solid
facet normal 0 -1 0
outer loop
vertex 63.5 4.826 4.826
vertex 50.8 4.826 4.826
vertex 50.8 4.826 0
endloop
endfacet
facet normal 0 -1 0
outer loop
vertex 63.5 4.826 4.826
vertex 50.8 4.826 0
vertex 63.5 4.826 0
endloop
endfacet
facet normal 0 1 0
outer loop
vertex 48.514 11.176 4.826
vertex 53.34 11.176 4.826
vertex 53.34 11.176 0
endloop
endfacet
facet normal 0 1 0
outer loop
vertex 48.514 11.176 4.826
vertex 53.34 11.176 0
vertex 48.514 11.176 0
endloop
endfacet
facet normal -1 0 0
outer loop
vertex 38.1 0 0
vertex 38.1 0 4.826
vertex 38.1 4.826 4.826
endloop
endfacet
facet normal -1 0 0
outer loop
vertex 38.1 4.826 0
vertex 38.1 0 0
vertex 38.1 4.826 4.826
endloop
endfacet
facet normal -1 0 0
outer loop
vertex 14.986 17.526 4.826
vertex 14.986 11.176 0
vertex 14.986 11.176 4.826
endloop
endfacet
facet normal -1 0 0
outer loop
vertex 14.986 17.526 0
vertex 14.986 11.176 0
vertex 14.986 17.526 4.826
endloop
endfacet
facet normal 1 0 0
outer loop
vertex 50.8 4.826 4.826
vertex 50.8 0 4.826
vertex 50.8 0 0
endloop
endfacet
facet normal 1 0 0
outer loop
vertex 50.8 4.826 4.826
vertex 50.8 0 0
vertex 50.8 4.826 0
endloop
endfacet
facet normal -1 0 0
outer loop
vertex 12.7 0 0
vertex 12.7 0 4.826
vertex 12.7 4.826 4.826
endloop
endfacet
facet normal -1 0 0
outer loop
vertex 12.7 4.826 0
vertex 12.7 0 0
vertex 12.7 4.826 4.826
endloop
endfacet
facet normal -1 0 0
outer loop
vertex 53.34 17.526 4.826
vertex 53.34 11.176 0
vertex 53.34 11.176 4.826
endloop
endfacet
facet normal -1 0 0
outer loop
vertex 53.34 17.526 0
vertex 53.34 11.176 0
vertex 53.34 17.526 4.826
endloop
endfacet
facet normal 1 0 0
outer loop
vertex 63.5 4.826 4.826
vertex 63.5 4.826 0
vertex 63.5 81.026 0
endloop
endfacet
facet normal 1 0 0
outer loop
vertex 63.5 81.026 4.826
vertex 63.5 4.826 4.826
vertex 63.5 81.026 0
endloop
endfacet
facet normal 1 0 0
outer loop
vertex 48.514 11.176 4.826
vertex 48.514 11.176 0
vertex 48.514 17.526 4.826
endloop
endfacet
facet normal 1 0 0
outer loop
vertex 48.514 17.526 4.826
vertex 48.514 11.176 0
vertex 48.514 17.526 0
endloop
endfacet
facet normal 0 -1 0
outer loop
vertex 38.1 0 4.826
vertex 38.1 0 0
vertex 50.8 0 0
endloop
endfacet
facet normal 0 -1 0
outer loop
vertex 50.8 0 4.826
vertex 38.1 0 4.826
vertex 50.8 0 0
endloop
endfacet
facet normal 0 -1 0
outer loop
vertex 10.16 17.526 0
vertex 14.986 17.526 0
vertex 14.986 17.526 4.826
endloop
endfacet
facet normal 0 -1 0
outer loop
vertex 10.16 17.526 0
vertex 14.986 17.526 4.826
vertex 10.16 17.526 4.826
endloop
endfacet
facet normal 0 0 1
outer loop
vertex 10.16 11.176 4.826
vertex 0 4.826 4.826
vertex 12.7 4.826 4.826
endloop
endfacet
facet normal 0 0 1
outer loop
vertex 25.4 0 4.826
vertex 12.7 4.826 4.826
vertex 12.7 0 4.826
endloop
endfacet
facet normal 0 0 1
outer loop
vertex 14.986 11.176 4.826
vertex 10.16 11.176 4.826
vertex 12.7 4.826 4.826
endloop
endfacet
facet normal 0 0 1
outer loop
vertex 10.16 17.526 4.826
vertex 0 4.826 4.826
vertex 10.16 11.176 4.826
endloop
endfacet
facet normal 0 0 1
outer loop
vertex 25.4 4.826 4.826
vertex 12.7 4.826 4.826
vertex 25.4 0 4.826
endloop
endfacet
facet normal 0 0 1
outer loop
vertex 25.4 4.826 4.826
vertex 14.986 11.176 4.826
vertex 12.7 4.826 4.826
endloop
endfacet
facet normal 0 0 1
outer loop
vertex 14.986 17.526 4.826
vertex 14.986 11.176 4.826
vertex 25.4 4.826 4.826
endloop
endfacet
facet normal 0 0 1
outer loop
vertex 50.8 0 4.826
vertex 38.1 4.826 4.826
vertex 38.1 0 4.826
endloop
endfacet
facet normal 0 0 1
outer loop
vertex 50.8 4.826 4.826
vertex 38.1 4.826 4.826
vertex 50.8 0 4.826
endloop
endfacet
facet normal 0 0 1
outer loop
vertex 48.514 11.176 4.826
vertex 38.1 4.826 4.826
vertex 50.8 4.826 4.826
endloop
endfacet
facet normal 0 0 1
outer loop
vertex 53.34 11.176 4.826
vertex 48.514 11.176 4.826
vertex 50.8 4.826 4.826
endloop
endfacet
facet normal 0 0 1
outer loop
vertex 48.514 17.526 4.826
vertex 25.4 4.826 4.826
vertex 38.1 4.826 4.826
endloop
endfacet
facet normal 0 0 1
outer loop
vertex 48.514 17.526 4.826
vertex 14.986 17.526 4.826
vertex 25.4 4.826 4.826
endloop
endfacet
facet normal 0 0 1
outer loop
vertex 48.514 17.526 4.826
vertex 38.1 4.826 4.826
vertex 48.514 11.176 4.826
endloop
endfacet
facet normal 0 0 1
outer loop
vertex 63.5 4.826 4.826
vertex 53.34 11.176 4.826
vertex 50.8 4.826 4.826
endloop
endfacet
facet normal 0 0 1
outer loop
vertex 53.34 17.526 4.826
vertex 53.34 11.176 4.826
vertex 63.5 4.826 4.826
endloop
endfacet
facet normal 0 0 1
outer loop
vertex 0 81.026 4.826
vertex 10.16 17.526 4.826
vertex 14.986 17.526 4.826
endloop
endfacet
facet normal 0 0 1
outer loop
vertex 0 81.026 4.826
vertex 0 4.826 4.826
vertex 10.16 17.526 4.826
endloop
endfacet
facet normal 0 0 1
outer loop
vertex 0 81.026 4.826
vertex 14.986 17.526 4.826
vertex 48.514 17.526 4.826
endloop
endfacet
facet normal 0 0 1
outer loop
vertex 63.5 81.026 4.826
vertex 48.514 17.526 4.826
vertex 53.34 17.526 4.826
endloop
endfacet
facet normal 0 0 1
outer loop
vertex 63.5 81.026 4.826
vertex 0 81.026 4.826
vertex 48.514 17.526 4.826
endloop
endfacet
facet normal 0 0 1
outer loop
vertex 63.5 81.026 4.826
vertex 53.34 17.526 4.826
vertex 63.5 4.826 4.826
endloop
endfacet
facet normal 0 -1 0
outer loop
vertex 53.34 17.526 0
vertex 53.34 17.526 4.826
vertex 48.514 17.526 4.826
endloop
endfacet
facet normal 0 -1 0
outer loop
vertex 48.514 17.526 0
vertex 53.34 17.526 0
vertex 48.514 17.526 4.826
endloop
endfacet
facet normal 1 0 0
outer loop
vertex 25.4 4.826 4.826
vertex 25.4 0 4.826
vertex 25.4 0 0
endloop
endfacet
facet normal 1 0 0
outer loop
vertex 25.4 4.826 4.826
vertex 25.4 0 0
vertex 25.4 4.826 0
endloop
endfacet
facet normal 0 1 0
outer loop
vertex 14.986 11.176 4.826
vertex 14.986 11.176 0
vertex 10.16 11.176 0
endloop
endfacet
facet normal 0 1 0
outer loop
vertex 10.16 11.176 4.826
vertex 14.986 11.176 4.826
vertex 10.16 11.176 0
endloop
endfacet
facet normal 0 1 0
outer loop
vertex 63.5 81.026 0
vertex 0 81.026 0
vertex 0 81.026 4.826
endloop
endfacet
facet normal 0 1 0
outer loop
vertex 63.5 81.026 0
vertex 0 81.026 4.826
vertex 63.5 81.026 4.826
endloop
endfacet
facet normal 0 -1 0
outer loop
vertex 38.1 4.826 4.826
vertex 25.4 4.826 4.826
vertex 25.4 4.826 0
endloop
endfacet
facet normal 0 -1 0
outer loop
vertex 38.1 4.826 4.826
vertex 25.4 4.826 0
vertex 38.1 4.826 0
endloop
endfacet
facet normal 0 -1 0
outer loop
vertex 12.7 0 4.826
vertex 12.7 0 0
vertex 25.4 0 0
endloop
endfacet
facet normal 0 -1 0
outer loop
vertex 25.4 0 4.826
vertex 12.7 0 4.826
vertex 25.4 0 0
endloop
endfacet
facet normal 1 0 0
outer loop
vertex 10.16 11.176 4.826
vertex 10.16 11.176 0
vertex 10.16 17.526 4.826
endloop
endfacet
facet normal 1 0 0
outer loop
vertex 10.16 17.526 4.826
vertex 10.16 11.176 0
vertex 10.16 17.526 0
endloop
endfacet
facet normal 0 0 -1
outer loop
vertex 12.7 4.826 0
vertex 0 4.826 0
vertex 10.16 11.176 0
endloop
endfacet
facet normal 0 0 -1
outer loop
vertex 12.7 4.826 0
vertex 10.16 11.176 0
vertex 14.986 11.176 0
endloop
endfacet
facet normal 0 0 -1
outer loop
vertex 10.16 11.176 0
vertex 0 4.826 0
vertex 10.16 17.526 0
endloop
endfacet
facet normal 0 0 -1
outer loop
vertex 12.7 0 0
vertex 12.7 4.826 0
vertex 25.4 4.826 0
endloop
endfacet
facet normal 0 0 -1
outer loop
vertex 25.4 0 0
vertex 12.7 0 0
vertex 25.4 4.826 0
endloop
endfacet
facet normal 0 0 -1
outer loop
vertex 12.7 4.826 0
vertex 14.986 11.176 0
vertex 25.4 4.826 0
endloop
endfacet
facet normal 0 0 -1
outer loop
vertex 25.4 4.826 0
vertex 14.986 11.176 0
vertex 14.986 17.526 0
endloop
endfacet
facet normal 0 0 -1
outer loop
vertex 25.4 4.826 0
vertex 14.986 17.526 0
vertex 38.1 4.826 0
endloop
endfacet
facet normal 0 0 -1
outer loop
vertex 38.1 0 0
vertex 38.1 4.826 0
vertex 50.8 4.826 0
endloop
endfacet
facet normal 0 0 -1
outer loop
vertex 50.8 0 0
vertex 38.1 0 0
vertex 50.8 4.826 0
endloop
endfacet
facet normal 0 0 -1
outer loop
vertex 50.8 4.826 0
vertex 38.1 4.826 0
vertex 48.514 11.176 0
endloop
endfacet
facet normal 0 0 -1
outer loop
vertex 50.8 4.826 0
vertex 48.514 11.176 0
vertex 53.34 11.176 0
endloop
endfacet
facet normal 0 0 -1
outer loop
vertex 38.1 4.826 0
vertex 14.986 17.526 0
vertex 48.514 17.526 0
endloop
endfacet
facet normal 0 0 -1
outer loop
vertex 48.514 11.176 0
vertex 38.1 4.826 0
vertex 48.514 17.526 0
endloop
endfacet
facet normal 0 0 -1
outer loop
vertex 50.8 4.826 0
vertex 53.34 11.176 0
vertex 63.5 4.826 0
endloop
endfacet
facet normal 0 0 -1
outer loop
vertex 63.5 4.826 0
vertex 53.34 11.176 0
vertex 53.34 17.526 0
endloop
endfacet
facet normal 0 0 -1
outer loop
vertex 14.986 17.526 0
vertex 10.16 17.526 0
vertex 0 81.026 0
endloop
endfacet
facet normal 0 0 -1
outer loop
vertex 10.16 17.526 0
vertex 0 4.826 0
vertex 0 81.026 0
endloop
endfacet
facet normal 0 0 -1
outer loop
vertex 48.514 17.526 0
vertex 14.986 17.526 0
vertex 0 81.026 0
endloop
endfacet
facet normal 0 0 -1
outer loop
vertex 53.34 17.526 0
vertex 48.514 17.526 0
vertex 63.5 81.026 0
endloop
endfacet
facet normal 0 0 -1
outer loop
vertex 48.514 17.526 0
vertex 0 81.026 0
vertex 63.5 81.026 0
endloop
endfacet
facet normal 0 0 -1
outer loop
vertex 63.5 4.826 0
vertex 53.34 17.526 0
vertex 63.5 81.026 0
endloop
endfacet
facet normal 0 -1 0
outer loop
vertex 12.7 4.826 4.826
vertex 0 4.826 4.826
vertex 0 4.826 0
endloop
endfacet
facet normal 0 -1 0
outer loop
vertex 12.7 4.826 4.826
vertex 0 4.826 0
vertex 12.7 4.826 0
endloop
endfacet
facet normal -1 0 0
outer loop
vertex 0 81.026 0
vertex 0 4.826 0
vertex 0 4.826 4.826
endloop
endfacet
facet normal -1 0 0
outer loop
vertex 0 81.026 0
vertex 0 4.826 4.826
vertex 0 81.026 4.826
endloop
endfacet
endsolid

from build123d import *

# Parameters (mm, degrees)
SKETCH1_W           = 63.5
SKETCH1_H           = 81.026
BOSS_EXTRUDE1_DEPTH = 4.826
SKETCH2_W           = 12.7
SKETCH2_H           = 4.826
CUT_EXTRUDE1_DEPTH  = 104.057037373
SKETCH3_W           = 4.826
SKETCH3_H           = 6.35
CUT_EXTRUDE2_DEPTH  = 4.826


with BuildPart() as part:
    # Sketch1 → Boss-Extrude1 (new body)
    with BuildSketch(Plane.XY):
        with Locations((31.75, 40.513)):
            Rectangle(SKETCH1_W, SKETCH1_H)
    extrude(amount=BOSS_EXTRUDE1_DEPTH)

    # Sketch2 → Cut-Extrude1 (cut, through all)
    with BuildSketch(Plane.XY.offset(4.826)):
        with Locations((6.35, 2.413)):
            Rectangle(SKETCH2_W, SKETCH2_H)
        with Locations((31.75, 2.413)):
            Rectangle(SKETCH2_W, SKETCH2_H)
        with Locations((57.15, 2.413)):
            Rectangle(SKETCH2_W, SKETCH2_H)
    extrude(amount=-CUT_EXTRUDE1_DEPTH, mode=Mode.SUBTRACT)

    # Sketch3 → Cut-Extrude2 (cut)
    with BuildSketch(Plane(origin=(0, 0, 0), x_dir=(-1, 0, 0), z_dir=(0, 0, -1))):
        with Locations((-50.927, 14.351)):
            Rectangle(SKETCH3_W, SKETCH3_H)
        with Locations((-12.573, 14.351)):
            Rectangle(SKETCH3_W, SKETCH3_H)
    extrude(amount=-CUT_EXTRUDE2_DEPTH, mode=Mode.SUBTRACT)


solid = part.part
